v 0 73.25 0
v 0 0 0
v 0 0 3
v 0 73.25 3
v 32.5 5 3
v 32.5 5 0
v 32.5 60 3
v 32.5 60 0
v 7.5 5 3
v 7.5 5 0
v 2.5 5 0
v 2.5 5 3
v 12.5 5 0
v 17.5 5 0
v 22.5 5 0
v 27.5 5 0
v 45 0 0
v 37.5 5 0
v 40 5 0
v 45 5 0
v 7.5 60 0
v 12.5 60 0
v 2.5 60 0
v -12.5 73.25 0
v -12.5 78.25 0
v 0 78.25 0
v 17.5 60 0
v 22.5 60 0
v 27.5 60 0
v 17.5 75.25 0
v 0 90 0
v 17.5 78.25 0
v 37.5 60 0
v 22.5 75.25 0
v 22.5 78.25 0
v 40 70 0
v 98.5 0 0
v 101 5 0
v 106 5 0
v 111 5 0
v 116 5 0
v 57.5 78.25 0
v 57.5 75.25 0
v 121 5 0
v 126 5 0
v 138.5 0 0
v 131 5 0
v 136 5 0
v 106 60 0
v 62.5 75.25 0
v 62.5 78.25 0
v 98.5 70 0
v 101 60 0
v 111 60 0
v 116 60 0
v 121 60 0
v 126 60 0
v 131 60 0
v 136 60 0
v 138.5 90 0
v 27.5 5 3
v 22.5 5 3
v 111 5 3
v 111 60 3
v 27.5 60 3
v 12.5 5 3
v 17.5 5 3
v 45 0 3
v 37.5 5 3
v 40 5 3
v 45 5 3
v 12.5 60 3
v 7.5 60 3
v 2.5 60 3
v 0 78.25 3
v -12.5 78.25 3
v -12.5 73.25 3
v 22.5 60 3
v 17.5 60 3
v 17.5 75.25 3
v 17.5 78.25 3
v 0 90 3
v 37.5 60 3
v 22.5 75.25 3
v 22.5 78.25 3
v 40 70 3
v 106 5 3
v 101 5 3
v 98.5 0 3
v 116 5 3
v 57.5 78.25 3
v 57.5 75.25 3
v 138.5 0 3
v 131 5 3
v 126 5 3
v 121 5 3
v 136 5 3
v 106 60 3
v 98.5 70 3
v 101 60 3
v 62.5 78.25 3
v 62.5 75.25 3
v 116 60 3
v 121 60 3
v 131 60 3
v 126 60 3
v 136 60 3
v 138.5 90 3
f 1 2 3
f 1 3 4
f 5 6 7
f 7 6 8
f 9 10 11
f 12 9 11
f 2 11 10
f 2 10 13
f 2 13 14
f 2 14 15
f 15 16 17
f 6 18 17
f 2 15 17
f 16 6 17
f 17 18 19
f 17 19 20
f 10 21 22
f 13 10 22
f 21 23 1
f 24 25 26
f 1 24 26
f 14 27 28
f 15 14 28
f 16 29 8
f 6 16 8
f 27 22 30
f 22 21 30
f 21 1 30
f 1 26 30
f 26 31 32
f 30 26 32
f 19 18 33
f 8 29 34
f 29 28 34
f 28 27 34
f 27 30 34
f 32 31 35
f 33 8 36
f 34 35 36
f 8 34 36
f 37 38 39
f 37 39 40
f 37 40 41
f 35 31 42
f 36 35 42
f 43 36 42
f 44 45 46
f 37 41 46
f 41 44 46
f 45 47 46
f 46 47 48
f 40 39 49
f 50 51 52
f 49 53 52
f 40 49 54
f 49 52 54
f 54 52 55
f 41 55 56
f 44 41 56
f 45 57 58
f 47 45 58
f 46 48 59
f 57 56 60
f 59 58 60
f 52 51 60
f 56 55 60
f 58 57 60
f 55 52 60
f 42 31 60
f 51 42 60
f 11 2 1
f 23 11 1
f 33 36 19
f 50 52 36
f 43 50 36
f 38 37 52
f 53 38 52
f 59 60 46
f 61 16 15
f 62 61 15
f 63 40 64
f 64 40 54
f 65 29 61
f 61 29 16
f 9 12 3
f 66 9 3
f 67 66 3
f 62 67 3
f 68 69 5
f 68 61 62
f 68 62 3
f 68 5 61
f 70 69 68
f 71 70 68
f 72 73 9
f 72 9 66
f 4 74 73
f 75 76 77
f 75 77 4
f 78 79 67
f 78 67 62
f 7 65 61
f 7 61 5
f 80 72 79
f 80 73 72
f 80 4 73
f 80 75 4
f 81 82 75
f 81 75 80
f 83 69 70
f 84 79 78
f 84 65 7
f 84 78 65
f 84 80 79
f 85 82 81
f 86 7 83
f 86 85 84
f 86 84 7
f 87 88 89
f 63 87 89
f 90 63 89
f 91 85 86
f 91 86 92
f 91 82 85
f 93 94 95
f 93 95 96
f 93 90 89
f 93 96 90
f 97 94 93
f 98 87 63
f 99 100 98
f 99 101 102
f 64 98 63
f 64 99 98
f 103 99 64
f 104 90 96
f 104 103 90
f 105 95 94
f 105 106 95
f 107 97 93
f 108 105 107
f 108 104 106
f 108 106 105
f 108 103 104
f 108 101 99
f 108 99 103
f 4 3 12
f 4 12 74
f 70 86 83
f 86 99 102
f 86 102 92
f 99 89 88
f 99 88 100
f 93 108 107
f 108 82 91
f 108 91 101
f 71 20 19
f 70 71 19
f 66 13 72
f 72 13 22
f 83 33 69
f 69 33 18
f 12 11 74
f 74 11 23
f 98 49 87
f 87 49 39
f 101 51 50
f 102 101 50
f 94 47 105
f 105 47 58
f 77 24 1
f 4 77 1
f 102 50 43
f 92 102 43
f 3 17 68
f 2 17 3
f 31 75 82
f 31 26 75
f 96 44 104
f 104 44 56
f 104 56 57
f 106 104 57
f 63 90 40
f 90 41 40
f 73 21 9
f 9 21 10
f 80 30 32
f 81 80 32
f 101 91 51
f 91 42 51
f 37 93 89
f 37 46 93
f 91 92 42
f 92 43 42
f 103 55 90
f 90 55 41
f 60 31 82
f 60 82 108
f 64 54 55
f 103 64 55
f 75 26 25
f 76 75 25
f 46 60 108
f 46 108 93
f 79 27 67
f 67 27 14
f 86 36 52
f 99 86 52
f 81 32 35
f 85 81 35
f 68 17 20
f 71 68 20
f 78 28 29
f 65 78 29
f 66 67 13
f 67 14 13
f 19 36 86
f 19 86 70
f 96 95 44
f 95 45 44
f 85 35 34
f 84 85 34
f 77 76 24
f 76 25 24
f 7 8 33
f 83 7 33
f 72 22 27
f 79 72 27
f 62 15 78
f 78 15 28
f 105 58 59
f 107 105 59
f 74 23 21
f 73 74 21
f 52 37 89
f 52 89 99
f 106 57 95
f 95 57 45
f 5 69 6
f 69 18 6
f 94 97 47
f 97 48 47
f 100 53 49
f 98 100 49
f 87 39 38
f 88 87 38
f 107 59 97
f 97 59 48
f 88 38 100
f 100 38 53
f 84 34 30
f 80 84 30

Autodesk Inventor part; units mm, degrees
ref_plane "YZ Plane" through (0, 0, 0) normal (1, 0, 0) x (0, 1, 0)
ref_plane "XZ Plane" through (0, 0, 0) normal (0, 1, 0) x (-1, 0, 0)
ref_plane "XY Plane" through (0, 0, 0) normal (0, 0, 1) x (1, 0, 0)
sketch "Boceto1" plane through (0, 0, 0) normal (0, 0, 1) x (1, 0, 0)
  line L0 (40, 70) -> (40, 5)
  line L1 (2.5, 60) -> (7.5, 60)
  line L2 (7.5, 60) -> (7.5, 5)
  line L3 (7.5, 5) -> (2.5, 5)
  line L4 (2.5, 5) -> (2.5, 60)
  line L5 (12.5, 60) -> (17.5, 60)
  line L6 (17.5, 60) -> (17.5, 5)
  line L7 (17.5, 5) -> (12.5, 5)
  line L8 (12.5, 5) -> (12.5, 60)
  line L9 (22.5, 60) -> (27.5, 60)
  line L10 (27.5, 60) -> (27.5, 5)
  line L11 (27.5, 5) -> (22.5, 5)
  line L12 (22.5, 5) -> (22.5, 60)
  line L13 (32.5, 60) -> (37.5, 60)
  line L14 (37.5, 60) -> (37.5, 5)
  line L15 (37.5, 5) -> (32.5, 5)
  line L16 (32.5, 5) -> (32.5, 60)
  line L17 (138.5, 90) -> (138.5, 0)
  line L18 (138.5, 0) -> (98.5, 0)
  line L19 (98.5, 0) -> (98.5, 70)
  line L20 (101, 60) -> (106, 60)
  line L21 (106, 60) -> (106, 5)
  line L22 (106, 5) -> (101, 5)
  line L23 (101, 5) -> (101, 60)
  line L24 (111, 60) -> (116, 60)
  line L25 (116, 60) -> (116, 5)
  line L26 (116, 5) -> (111, 5)
  line L27 (111, 5) -> (111, 60)
  line L28 (121, 60) -> (126, 60)
  line L29 (126, 60) -> (126, 5)
  line L30 (126, 5) -> (121, 5)
  line L31 (121, 5) -> (121, 60)
  line L32 (136, 60) -> (136, 5)
  line L33 (131, 5) -> (131, 60)
  line L34 (131, 60) -> (136, 60)
  line L35 (136, 5) -> (131, 5)
  line L36 (0, 90) -> (138.5, 90)
  line L37 (40, 70) -> (98.5, 70)
  line L38 (17.5, 78.25) -> (22.5, 78.25)
  line L39 (22.5, 78.25) -> (22.5, 75.25)
  line L40 (22.5, 75.25) -> (17.5, 75.25)
  line L41 (17.5, 75.25) -> (17.5, 78.25)
  line L42 (20, 78.25) -> (20, 75.25) construction
  line L43 (17.5, 76.75) -> (22.5, 76.75) construction
  line L44 (57.5, 78.25) -> (62.5, 78.25)
  line L45 (62.5, 78.25) -> (62.5, 75.25)
  line L46 (62.5, 75.25) -> (57.5, 75.25)
  line L47 (57.5, 75.25) -> (57.5, 78.25)
  line L48 (60, 78.25) -> (60, 75.25) construction
  line L49 (57.5, 76.75) -> (62.5, 76.75) construction
  line L50 (45, 0) -> (45, 5)
  line L51 (45, 5) -> (40, 5)
  line L52 (45, 0) -> (0, 0)
  line L53 (0, 78.25) -> (-12.5, 78.25)
  line L54 (-12.5, 78.25) -> (-12.5, 73.25)
  line L55 (-12.5, 73.25) -> (0, 73.25)
  line L56 (0, 0) -> (0, 73.25)
  line L57 (0, 78.25) -> (0, 90)
  point P0 (0, 0)
  dimension "d46" = 5
  dimension "d85" = 5
  dimension "d86" = 5
  dimension "d87" = 5
  dimension "d89" = 40
  dimension "d90" = 5
  dimension "d94" = 5
  dimension "d95" = 5
  dimension "d96" = 5
  dimension "d112" = 2.5
  dimension "d120" = 5
  dimension "d121" = 3
  dimension "d134" = 5
  dimension "d135" = 3
  dimension "d136" = 35
  dimension "d141" = 5
  dimension "d145" = 55
  dimension "d155" = 70
  dimension "d156" = 90
  dimension "d157" = 76.75
  dimension "d158" = 5
  dimension "d161" = 5
  dimension "d162" = 40
  dimension "d163" = 2.5
  dimension "d164" = 138.5
  dimension "d165" = 20
  dimension "d166" = 12.5
extrude "Extrusión7" add sketch "Boceto1" along normal blind 3
properties part number "Celda puertas"
